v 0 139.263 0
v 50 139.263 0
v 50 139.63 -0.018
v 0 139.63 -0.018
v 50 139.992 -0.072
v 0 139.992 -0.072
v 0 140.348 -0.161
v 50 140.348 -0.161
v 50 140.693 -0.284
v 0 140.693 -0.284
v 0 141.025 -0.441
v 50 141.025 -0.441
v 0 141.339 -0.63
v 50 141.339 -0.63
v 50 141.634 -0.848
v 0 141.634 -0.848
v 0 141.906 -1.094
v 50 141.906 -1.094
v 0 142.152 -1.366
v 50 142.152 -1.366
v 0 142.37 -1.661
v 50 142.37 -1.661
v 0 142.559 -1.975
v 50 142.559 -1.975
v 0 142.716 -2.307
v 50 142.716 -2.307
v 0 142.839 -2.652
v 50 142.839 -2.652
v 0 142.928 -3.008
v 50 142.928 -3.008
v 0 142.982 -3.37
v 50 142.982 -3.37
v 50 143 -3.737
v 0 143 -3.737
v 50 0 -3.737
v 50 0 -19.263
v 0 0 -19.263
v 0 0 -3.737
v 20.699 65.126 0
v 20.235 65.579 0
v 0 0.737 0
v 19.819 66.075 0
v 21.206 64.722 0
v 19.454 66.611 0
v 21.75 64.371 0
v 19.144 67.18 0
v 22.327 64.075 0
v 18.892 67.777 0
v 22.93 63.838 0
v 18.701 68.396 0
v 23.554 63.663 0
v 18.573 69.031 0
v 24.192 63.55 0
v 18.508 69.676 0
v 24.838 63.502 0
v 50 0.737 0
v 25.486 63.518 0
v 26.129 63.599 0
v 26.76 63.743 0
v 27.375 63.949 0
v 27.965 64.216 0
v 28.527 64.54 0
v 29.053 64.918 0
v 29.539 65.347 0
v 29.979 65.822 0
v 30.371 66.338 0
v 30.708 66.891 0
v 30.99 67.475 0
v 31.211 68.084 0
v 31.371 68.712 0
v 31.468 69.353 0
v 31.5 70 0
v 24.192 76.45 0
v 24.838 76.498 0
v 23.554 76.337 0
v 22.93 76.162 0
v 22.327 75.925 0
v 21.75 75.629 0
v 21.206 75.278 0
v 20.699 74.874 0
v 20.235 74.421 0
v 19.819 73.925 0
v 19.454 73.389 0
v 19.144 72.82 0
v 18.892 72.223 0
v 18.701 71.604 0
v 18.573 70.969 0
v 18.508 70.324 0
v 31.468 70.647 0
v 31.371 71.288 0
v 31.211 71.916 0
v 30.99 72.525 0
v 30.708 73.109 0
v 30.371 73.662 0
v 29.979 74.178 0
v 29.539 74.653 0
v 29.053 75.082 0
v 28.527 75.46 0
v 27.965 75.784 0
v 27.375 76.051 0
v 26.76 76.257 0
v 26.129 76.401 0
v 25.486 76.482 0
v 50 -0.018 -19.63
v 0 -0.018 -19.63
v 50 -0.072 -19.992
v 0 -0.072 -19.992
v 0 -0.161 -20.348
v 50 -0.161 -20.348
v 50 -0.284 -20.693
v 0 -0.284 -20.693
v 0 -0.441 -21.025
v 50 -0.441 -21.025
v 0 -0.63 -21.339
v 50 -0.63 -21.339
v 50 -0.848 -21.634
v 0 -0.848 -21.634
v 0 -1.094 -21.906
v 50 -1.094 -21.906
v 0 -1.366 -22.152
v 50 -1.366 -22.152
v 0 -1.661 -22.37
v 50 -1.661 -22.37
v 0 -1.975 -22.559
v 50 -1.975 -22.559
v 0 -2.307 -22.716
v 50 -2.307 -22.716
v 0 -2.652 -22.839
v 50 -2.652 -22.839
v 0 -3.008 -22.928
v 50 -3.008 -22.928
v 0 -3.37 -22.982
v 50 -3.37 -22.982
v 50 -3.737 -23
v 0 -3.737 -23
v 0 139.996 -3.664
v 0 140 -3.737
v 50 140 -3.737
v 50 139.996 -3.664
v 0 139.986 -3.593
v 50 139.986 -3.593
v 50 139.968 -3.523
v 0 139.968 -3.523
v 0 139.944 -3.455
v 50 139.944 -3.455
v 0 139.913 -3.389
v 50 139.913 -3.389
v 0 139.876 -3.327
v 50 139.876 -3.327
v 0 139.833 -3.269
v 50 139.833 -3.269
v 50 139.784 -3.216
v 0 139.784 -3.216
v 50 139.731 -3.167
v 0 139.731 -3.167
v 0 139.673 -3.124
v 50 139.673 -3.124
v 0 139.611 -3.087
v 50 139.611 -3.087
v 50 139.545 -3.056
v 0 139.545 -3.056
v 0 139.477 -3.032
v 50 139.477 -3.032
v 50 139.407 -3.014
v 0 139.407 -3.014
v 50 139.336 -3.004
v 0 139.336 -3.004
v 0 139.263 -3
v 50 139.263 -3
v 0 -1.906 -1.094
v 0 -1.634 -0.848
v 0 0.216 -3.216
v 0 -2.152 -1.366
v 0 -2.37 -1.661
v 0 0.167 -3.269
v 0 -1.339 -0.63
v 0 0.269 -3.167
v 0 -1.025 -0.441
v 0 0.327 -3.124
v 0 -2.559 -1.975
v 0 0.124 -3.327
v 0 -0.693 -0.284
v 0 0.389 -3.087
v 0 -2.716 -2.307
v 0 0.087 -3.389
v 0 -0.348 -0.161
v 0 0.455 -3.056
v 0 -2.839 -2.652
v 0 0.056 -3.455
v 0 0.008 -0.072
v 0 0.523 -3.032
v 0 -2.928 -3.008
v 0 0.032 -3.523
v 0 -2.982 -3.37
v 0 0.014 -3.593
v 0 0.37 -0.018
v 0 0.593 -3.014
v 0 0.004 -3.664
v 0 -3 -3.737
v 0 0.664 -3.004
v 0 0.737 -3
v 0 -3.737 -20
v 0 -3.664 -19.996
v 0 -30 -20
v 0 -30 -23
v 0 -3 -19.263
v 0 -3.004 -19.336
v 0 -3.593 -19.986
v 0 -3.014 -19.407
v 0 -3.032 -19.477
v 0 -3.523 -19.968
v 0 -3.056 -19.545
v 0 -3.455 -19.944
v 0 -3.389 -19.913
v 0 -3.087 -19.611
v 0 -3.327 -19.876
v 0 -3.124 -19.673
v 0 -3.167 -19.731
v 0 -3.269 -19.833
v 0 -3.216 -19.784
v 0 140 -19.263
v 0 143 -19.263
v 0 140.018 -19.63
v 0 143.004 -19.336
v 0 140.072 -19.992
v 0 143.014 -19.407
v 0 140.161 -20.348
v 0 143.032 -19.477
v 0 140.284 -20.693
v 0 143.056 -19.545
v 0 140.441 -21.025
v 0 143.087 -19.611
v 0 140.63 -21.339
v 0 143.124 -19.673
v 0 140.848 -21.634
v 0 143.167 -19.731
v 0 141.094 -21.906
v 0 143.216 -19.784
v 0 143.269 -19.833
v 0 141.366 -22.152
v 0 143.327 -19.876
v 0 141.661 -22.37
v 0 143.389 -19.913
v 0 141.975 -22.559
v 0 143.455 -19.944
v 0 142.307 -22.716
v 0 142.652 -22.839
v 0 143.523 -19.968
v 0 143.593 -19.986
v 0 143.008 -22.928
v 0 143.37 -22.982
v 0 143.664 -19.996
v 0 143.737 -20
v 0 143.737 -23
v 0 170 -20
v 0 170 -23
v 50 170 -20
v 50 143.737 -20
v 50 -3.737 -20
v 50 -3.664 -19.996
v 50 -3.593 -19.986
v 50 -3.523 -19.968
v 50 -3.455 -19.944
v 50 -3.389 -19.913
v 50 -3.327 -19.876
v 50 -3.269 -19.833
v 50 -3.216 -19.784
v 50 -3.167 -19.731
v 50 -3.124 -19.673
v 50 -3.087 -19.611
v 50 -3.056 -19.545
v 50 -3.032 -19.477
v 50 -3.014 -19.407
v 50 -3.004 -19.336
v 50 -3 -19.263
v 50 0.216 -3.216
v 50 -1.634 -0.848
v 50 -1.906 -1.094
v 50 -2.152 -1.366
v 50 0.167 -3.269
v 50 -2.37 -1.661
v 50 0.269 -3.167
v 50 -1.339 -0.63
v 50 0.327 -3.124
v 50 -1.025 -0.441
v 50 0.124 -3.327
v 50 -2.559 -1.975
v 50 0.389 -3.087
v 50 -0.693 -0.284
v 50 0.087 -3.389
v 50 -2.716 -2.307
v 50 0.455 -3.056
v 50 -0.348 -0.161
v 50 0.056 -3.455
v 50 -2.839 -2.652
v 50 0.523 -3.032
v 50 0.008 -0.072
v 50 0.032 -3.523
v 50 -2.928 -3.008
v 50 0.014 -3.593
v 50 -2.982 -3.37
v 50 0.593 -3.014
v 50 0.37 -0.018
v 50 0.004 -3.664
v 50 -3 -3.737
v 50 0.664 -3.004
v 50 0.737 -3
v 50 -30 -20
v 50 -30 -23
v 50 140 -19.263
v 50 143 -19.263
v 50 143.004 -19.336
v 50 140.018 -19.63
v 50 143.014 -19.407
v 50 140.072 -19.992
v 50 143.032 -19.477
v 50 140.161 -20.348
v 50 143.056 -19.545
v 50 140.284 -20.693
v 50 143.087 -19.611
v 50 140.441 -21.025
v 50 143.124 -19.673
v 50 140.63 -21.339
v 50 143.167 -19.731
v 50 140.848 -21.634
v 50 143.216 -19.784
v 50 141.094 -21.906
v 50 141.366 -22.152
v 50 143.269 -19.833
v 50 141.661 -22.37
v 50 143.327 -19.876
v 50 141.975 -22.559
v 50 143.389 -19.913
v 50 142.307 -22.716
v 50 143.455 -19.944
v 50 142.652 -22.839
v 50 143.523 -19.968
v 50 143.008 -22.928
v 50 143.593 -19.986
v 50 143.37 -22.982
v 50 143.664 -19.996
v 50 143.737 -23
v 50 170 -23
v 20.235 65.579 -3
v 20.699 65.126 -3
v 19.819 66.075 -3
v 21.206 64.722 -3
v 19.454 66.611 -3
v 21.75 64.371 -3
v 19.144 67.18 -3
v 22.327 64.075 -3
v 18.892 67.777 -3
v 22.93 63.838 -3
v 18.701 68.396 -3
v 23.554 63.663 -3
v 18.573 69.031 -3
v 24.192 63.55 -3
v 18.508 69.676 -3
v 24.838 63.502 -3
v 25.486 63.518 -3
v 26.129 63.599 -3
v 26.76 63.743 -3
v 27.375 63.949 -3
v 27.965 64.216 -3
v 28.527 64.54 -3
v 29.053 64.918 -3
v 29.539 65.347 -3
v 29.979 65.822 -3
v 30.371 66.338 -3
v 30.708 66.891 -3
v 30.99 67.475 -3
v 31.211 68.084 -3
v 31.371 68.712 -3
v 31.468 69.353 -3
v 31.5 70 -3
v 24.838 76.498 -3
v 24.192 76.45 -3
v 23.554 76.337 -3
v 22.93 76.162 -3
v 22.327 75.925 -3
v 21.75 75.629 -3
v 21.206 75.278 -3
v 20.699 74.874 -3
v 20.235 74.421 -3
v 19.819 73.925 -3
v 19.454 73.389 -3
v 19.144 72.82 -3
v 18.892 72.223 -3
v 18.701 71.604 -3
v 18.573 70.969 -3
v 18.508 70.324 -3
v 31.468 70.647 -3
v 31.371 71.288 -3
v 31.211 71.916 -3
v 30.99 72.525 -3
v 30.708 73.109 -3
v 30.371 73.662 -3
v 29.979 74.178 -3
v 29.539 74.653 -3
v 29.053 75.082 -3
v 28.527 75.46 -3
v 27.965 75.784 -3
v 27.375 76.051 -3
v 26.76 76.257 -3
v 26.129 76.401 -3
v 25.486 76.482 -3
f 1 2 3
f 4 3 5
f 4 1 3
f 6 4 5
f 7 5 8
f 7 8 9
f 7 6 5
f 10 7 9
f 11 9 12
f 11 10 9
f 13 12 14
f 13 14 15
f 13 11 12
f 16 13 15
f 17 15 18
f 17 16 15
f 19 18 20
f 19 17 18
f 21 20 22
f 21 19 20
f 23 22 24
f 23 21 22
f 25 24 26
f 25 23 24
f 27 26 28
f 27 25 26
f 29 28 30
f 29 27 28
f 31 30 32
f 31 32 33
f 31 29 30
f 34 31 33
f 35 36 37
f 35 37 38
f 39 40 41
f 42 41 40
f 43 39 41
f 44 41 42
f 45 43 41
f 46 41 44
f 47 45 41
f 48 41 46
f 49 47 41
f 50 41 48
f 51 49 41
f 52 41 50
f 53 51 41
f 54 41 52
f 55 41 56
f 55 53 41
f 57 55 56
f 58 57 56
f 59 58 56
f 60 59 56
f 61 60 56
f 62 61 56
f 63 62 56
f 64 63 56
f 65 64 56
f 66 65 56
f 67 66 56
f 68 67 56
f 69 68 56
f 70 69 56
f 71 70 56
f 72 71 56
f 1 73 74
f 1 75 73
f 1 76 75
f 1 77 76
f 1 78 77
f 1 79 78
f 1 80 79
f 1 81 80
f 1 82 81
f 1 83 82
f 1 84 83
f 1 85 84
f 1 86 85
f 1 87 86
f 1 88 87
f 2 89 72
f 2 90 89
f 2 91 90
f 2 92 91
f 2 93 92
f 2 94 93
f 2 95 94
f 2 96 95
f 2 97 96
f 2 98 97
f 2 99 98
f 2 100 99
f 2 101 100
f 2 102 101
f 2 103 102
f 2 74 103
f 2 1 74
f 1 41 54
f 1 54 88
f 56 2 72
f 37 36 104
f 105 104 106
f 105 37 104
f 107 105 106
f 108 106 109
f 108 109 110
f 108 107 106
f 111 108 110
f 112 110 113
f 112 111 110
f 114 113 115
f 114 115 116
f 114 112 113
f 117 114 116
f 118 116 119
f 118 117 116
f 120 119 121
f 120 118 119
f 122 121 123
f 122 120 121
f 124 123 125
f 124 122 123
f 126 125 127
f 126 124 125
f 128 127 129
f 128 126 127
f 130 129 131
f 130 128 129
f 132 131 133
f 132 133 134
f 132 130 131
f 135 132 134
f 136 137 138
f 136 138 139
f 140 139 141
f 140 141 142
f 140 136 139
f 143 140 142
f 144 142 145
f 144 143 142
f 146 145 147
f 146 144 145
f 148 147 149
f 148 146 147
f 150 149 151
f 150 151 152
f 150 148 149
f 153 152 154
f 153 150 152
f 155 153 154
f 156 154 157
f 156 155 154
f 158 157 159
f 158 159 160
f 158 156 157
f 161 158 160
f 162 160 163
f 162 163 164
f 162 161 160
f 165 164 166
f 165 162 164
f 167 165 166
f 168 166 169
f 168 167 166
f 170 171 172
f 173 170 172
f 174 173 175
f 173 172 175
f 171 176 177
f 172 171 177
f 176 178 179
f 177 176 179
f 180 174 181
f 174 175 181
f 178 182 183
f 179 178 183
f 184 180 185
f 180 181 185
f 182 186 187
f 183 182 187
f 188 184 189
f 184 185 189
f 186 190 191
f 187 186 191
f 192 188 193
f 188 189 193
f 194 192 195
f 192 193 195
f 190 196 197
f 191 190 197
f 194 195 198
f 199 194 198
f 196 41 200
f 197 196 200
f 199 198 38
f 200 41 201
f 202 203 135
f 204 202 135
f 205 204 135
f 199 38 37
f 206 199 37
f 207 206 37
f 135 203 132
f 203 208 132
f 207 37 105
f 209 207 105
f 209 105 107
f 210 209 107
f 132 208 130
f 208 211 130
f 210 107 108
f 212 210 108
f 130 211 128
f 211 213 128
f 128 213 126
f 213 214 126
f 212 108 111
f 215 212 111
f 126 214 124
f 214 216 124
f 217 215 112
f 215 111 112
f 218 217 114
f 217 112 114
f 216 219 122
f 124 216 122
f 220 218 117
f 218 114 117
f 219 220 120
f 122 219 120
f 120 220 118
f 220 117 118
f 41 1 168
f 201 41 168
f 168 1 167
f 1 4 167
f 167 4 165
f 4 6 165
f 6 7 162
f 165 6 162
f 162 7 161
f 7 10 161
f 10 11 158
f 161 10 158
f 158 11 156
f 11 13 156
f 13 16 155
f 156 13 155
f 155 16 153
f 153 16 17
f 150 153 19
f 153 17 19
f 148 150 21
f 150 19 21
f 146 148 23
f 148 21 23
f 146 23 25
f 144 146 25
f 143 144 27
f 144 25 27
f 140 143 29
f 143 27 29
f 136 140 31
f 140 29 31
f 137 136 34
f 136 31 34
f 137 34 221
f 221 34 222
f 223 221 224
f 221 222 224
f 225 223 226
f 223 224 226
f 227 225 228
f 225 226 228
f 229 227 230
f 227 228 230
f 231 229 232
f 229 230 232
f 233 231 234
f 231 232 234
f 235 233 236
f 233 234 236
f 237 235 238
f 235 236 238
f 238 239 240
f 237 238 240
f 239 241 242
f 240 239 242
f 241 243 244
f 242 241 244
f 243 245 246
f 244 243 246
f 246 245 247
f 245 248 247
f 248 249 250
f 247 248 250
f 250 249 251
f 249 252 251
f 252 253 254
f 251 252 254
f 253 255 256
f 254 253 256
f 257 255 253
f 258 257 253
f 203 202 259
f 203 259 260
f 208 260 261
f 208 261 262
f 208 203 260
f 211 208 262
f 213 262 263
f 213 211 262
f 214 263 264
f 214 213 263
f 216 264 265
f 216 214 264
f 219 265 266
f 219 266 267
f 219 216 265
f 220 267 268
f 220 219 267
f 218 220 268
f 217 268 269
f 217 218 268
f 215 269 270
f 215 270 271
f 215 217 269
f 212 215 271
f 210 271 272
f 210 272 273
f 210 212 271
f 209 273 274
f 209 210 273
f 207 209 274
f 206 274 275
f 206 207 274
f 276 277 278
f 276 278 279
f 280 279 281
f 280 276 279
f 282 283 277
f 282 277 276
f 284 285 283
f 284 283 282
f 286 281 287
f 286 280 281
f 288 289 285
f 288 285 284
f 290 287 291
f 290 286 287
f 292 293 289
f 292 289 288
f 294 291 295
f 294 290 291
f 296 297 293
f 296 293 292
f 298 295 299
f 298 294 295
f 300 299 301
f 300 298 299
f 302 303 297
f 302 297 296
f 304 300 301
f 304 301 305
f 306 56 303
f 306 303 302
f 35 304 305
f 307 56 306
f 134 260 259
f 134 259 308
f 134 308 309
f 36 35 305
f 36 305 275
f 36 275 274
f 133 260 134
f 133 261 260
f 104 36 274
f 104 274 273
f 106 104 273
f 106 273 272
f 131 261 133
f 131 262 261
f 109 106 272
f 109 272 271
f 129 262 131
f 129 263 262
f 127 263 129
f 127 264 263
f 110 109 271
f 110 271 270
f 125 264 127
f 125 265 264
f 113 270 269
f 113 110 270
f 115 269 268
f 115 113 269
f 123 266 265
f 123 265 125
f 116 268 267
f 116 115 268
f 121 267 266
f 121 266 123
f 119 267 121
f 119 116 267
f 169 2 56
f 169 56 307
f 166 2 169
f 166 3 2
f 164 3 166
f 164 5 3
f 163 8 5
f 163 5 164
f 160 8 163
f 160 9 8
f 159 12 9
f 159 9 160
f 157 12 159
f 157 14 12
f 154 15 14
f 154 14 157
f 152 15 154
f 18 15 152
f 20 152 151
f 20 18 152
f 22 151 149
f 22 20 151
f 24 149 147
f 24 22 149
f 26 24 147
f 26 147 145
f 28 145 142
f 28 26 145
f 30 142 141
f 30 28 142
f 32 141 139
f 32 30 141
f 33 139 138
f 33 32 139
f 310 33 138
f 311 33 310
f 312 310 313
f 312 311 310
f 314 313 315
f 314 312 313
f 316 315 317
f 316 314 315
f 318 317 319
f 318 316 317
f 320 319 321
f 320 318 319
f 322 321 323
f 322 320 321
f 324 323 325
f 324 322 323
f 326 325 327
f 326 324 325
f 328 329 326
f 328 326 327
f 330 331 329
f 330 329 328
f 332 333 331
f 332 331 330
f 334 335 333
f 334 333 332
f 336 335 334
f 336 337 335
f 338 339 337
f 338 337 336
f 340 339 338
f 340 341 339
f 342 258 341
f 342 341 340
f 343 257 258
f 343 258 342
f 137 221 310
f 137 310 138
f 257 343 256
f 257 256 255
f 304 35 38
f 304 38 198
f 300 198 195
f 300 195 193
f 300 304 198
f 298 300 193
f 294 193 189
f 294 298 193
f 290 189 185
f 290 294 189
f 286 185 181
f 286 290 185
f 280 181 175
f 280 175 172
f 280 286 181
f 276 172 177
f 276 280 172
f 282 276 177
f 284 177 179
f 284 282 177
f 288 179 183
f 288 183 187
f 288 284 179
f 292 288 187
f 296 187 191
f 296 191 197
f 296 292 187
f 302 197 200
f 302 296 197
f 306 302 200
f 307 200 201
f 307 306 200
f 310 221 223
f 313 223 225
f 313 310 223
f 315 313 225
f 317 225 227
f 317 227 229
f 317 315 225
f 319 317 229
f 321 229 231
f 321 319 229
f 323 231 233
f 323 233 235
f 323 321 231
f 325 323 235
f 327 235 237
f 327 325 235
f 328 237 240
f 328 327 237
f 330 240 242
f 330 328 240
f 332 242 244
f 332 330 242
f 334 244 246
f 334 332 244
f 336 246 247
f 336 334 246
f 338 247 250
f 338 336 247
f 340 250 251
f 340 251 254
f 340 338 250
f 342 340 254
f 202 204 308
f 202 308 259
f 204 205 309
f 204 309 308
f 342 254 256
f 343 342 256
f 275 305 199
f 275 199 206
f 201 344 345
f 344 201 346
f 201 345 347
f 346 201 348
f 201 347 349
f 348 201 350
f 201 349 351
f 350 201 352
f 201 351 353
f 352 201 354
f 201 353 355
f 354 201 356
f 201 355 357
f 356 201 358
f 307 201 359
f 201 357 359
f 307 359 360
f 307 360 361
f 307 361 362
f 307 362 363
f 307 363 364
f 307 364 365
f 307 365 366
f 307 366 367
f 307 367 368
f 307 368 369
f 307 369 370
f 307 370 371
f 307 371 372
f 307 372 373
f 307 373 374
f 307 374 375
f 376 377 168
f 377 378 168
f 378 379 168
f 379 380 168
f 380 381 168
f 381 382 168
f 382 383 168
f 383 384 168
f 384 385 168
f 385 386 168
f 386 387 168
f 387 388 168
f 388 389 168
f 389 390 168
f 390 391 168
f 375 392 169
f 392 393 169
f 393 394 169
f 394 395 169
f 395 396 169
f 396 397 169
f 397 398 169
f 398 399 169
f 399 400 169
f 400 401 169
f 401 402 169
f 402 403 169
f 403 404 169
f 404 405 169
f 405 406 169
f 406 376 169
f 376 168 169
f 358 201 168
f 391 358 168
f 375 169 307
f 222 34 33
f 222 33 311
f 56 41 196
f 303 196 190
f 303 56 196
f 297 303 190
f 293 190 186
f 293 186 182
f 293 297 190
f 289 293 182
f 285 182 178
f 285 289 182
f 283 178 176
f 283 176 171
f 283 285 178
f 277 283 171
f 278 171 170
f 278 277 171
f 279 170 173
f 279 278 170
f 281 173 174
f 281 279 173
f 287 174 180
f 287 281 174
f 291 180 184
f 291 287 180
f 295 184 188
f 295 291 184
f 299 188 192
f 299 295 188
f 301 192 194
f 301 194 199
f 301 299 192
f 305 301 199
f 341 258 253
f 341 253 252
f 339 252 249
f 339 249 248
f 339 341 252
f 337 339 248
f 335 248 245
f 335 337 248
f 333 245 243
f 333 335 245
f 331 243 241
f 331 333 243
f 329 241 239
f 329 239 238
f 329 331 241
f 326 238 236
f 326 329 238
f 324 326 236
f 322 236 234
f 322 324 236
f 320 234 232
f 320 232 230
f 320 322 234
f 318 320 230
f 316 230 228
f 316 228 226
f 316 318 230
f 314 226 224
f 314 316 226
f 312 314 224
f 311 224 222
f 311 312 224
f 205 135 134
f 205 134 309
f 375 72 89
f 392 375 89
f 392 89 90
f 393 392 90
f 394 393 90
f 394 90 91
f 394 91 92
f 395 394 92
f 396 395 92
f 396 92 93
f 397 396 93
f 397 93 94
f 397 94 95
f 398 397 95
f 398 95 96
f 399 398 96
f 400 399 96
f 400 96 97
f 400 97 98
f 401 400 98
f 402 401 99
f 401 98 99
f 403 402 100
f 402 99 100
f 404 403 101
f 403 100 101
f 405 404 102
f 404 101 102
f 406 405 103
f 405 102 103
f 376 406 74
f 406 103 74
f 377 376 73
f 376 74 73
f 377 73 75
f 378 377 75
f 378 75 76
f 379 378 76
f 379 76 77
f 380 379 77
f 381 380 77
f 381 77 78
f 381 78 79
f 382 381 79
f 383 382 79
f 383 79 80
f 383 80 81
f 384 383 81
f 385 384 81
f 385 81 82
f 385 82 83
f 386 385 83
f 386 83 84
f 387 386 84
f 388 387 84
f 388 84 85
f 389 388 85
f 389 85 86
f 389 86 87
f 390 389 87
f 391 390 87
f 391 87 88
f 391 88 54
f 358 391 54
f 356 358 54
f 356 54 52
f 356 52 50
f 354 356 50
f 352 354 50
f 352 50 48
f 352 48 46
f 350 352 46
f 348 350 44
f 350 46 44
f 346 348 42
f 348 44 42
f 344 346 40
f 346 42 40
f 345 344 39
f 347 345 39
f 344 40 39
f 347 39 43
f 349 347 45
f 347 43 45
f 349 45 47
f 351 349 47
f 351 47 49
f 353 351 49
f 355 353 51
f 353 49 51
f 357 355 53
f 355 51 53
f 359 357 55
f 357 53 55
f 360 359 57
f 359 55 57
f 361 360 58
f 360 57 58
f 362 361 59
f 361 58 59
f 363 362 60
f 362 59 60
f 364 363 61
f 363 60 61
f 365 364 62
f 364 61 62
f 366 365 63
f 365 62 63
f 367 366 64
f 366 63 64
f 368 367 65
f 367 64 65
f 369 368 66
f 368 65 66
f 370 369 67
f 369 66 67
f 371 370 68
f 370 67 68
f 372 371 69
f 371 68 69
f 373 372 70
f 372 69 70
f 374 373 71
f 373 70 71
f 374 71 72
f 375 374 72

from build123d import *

# Parameters (mm, degrees)
SKETCH_1_W                         = 50
SKETCH_1_H                         = 140
SM_BASE_FLANGE_1_DEPTH             = 3
SM_EDGE_FLANGE_1_STRIP_W           = 13.4732
SM_EDGE_FLANGE_1_STRIP_H           = 3
SM_EDGE_FLANGE_1_STRIP_CUT_DEPTH   = 50
SM_EDGE_FLANGE_1_STRIP_2_W         = 13.4732
SM_EDGE_FLANGE_1_STRIP_2_H         = 3
SM_EDGE_FLANGE_1_STRIP_CUT_2_DEPTH = 50
SM_EDGE_FLANGE_1_DEPTH             = 50
SM_EDGE_FLANGE_1_BEND_DEPTH        = 50
SM_EDGE_FLANGE_2_STRIP_W           = 13.4732
SM_EDGE_FLANGE_2_STRIP_H           = 3
SM_EDGE_FLANGE_2_STRIP_CUT_DEPTH   = 50
SM_EDGE_FLANGE_2_STRIP_2_W         = 13.4732
SM_EDGE_FLANGE_2_STRIP_2_H         = 3
SM_EDGE_FLANGE_2_STRIP_CUT_2_DEPTH = 50
SM_EDGE_FLANGE_2_DEPTH             = 50
SM_EDGE_FLANGE_2_BEND_DEPTH        = 50
SKETCH_18_R                        = 6.5
CUT_EXTRUDE_1_DEPTH                = 179.686876966


# Sheet-metal steps are written as plain solids
with BuildPart() as part:
    # Sketch 1 → 基体-法兰1 (new body)
    with BuildSketch(Plane.XY):
        with Locations((25, 70)):
            Rectangle(SKETCH_1_W, SKETCH_1_H)
    extrude(amount=-SM_BASE_FLANGE_1_DEPTH)

    # 边线-法兰1 strip (across the edge) → 边线-法兰1 strip cut (cut)
    with BuildSketch(Plane(origin=(0, 140, -3), x_dir=(0, -1, 0), z_dir=(1, 0, 0))):
        with Locations((-6, -1.5)):
            Rectangle(SM_EDGE_FLANGE_1_STRIP_W, SM_EDGE_FLANGE_1_STRIP_H)
    extrude(amount=SM_EDGE_FLANGE_1_STRIP_CUT_DEPTH, mode=Mode.SUBTRACT)

    # 边线-法兰1 strip 2 (across the edge) → 边线-法兰1 strip cut 2 (cut)
    with BuildSketch(Plane(origin=(50, 0, -3), x_dir=(0, 1, 0), z_dir=(-1, 0, 0))):
        with Locations((-6, -1.5)):
            Rectangle(SM_EDGE_FLANGE_1_STRIP_2_W, SM_EDGE_FLANGE_1_STRIP_2_H)
    extrude(amount=SM_EDGE_FLANGE_1_STRIP_CUT_2_DEPTH, mode=Mode.SUBTRACT)

    # 边线-法兰1 section (across the edge) → 边线-法兰1 (add)
    with BuildSketch(Plane(origin=(0, 140, -3), x_dir=(0, -1, 0), z_dir=(1, 0, 0))):
        with BuildLine():
            Line((-3, 0.7366), (-3, 17))
            Line((-3, 17), (0, 17))
            Line((0, 17), (0, 0.7366))
            ThreePointArc((0, 0.7366), (0.215745145, 0.215745145), (0.7366, 0))
            Line((0.7366, 0), (0.7366, -3))
            ThreePointArc((0.7366, -3), (-1.905575199, -1.905575199), (-3, 0.7366))
        make_face()
    extrude(amount=SM_EDGE_FLANGE_1_DEPTH)

    # 边线-法兰1 section 2 (across the edge) → 边线-法兰1 bend (add)
    with BuildSketch(Plane(origin=(50, 0, -3), x_dir=(0, 1, 0), z_dir=(-1, 0, 0))):
        with BuildLine():
            Line((-3, 0.7366), (-3, 17))
            Line((-3, 17), (0, 17))
            Line((0, 17), (0, 0.7366))
            ThreePointArc((0, 0.7366), (0.215745145, 0.215745145), (0.7366, 0))
            Line((0.7366, 0), (0.7366, -3))
            ThreePointArc((0.7366, -3), (-1.905575199, -1.905575199), (-3, 0.7366))
        make_face()
    extrude(amount=SM_EDGE_FLANGE_1_BEND_DEPTH)

    # 边线-法兰2 strip (across the edge) → 边线-法兰2 strip cut (cut)
    with BuildSketch(Plane(origin=(0, -3, -20), x_dir=(0, 0, 1), z_dir=(1, 0, 0))):
        with Locations((-6, -1.5)):
            Rectangle(SM_EDGE_FLANGE_2_STRIP_W, SM_EDGE_FLANGE_2_STRIP_H)
    extrude(amount=SM_EDGE_FLANGE_2_STRIP_CUT_DEPTH, mode=Mode.SUBTRACT)

    # 边线-法兰2 strip 2 (across the edge) → 边线-法兰2 strip cut 2 (cut)
    with BuildSketch(Plane(origin=(50, 143, -20), x_dir=(0, 0, 1), z_dir=(-1, 0, 0))):
        with Locations((-6, -1.5)):
            Rectangle(SM_EDGE_FLANGE_2_STRIP_2_W, SM_EDGE_FLANGE_2_STRIP_2_H)
    extrude(amount=SM_EDGE_FLANGE_2_STRIP_CUT_2_DEPTH, mode=Mode.SUBTRACT)

    # 边线-法兰2 section (across the edge) → 边线-法兰2 (add)
    with BuildSketch(Plane(origin=(0, -3, -20), x_dir=(0, 0, 1), z_dir=(1, 0, 0))):
        with BuildLine():
            Line((-3, 0.7366), (-3, 27))
            Line((-3, 27), (0, 27))
            Line((0, 27), (0, 0.7366))
            ThreePointArc((0, 0.7366), (0.215745145, 0.215745145), (0.7366, 0))
            Line((0.7366, 0), (0.7366, -3))
            ThreePointArc((0.7366, -3), (-1.905575199, -1.905575199), (-3, 0.7366))
        make_face()
    extrude(amount=SM_EDGE_FLANGE_2_DEPTH)

    # 边线-法兰2 section 2 (across the edge) → 边线-法兰2 bend (add)
    with BuildSketch(Plane(origin=(50, 143, -20), x_dir=(0, 0, 1), z_dir=(-1, 0, 0))):
        with BuildLine():
            Line((-3, 0.7366), (-3, 27))
            Line((-3, 27), (0, 27))
            Line((0, 27), (0, 0.7366))
            ThreePointArc((0, 0.7366), (0.215745145, 0.215745145), (0.7366, 0))
            Line((0.7366, 0), (0.7366, -3))
            ThreePointArc((0.7366, -3), (-1.905575199, -1.905575199), (-3, 0.7366))
        make_face()
    extrude(amount=SM_EDGE_FLANGE_2_BEND_DEPTH)

    # 草图18 → 切除-拉伸1 (cut, through all)
    with BuildSketch(Plane.XY):
        with Locations((25, 70)):
            Circle(SKETCH_18_R)
    extrude(amount=-CUT_EXTRUDE_1_DEPTH, mode=Mode.SUBTRACT)


solid = part.part
